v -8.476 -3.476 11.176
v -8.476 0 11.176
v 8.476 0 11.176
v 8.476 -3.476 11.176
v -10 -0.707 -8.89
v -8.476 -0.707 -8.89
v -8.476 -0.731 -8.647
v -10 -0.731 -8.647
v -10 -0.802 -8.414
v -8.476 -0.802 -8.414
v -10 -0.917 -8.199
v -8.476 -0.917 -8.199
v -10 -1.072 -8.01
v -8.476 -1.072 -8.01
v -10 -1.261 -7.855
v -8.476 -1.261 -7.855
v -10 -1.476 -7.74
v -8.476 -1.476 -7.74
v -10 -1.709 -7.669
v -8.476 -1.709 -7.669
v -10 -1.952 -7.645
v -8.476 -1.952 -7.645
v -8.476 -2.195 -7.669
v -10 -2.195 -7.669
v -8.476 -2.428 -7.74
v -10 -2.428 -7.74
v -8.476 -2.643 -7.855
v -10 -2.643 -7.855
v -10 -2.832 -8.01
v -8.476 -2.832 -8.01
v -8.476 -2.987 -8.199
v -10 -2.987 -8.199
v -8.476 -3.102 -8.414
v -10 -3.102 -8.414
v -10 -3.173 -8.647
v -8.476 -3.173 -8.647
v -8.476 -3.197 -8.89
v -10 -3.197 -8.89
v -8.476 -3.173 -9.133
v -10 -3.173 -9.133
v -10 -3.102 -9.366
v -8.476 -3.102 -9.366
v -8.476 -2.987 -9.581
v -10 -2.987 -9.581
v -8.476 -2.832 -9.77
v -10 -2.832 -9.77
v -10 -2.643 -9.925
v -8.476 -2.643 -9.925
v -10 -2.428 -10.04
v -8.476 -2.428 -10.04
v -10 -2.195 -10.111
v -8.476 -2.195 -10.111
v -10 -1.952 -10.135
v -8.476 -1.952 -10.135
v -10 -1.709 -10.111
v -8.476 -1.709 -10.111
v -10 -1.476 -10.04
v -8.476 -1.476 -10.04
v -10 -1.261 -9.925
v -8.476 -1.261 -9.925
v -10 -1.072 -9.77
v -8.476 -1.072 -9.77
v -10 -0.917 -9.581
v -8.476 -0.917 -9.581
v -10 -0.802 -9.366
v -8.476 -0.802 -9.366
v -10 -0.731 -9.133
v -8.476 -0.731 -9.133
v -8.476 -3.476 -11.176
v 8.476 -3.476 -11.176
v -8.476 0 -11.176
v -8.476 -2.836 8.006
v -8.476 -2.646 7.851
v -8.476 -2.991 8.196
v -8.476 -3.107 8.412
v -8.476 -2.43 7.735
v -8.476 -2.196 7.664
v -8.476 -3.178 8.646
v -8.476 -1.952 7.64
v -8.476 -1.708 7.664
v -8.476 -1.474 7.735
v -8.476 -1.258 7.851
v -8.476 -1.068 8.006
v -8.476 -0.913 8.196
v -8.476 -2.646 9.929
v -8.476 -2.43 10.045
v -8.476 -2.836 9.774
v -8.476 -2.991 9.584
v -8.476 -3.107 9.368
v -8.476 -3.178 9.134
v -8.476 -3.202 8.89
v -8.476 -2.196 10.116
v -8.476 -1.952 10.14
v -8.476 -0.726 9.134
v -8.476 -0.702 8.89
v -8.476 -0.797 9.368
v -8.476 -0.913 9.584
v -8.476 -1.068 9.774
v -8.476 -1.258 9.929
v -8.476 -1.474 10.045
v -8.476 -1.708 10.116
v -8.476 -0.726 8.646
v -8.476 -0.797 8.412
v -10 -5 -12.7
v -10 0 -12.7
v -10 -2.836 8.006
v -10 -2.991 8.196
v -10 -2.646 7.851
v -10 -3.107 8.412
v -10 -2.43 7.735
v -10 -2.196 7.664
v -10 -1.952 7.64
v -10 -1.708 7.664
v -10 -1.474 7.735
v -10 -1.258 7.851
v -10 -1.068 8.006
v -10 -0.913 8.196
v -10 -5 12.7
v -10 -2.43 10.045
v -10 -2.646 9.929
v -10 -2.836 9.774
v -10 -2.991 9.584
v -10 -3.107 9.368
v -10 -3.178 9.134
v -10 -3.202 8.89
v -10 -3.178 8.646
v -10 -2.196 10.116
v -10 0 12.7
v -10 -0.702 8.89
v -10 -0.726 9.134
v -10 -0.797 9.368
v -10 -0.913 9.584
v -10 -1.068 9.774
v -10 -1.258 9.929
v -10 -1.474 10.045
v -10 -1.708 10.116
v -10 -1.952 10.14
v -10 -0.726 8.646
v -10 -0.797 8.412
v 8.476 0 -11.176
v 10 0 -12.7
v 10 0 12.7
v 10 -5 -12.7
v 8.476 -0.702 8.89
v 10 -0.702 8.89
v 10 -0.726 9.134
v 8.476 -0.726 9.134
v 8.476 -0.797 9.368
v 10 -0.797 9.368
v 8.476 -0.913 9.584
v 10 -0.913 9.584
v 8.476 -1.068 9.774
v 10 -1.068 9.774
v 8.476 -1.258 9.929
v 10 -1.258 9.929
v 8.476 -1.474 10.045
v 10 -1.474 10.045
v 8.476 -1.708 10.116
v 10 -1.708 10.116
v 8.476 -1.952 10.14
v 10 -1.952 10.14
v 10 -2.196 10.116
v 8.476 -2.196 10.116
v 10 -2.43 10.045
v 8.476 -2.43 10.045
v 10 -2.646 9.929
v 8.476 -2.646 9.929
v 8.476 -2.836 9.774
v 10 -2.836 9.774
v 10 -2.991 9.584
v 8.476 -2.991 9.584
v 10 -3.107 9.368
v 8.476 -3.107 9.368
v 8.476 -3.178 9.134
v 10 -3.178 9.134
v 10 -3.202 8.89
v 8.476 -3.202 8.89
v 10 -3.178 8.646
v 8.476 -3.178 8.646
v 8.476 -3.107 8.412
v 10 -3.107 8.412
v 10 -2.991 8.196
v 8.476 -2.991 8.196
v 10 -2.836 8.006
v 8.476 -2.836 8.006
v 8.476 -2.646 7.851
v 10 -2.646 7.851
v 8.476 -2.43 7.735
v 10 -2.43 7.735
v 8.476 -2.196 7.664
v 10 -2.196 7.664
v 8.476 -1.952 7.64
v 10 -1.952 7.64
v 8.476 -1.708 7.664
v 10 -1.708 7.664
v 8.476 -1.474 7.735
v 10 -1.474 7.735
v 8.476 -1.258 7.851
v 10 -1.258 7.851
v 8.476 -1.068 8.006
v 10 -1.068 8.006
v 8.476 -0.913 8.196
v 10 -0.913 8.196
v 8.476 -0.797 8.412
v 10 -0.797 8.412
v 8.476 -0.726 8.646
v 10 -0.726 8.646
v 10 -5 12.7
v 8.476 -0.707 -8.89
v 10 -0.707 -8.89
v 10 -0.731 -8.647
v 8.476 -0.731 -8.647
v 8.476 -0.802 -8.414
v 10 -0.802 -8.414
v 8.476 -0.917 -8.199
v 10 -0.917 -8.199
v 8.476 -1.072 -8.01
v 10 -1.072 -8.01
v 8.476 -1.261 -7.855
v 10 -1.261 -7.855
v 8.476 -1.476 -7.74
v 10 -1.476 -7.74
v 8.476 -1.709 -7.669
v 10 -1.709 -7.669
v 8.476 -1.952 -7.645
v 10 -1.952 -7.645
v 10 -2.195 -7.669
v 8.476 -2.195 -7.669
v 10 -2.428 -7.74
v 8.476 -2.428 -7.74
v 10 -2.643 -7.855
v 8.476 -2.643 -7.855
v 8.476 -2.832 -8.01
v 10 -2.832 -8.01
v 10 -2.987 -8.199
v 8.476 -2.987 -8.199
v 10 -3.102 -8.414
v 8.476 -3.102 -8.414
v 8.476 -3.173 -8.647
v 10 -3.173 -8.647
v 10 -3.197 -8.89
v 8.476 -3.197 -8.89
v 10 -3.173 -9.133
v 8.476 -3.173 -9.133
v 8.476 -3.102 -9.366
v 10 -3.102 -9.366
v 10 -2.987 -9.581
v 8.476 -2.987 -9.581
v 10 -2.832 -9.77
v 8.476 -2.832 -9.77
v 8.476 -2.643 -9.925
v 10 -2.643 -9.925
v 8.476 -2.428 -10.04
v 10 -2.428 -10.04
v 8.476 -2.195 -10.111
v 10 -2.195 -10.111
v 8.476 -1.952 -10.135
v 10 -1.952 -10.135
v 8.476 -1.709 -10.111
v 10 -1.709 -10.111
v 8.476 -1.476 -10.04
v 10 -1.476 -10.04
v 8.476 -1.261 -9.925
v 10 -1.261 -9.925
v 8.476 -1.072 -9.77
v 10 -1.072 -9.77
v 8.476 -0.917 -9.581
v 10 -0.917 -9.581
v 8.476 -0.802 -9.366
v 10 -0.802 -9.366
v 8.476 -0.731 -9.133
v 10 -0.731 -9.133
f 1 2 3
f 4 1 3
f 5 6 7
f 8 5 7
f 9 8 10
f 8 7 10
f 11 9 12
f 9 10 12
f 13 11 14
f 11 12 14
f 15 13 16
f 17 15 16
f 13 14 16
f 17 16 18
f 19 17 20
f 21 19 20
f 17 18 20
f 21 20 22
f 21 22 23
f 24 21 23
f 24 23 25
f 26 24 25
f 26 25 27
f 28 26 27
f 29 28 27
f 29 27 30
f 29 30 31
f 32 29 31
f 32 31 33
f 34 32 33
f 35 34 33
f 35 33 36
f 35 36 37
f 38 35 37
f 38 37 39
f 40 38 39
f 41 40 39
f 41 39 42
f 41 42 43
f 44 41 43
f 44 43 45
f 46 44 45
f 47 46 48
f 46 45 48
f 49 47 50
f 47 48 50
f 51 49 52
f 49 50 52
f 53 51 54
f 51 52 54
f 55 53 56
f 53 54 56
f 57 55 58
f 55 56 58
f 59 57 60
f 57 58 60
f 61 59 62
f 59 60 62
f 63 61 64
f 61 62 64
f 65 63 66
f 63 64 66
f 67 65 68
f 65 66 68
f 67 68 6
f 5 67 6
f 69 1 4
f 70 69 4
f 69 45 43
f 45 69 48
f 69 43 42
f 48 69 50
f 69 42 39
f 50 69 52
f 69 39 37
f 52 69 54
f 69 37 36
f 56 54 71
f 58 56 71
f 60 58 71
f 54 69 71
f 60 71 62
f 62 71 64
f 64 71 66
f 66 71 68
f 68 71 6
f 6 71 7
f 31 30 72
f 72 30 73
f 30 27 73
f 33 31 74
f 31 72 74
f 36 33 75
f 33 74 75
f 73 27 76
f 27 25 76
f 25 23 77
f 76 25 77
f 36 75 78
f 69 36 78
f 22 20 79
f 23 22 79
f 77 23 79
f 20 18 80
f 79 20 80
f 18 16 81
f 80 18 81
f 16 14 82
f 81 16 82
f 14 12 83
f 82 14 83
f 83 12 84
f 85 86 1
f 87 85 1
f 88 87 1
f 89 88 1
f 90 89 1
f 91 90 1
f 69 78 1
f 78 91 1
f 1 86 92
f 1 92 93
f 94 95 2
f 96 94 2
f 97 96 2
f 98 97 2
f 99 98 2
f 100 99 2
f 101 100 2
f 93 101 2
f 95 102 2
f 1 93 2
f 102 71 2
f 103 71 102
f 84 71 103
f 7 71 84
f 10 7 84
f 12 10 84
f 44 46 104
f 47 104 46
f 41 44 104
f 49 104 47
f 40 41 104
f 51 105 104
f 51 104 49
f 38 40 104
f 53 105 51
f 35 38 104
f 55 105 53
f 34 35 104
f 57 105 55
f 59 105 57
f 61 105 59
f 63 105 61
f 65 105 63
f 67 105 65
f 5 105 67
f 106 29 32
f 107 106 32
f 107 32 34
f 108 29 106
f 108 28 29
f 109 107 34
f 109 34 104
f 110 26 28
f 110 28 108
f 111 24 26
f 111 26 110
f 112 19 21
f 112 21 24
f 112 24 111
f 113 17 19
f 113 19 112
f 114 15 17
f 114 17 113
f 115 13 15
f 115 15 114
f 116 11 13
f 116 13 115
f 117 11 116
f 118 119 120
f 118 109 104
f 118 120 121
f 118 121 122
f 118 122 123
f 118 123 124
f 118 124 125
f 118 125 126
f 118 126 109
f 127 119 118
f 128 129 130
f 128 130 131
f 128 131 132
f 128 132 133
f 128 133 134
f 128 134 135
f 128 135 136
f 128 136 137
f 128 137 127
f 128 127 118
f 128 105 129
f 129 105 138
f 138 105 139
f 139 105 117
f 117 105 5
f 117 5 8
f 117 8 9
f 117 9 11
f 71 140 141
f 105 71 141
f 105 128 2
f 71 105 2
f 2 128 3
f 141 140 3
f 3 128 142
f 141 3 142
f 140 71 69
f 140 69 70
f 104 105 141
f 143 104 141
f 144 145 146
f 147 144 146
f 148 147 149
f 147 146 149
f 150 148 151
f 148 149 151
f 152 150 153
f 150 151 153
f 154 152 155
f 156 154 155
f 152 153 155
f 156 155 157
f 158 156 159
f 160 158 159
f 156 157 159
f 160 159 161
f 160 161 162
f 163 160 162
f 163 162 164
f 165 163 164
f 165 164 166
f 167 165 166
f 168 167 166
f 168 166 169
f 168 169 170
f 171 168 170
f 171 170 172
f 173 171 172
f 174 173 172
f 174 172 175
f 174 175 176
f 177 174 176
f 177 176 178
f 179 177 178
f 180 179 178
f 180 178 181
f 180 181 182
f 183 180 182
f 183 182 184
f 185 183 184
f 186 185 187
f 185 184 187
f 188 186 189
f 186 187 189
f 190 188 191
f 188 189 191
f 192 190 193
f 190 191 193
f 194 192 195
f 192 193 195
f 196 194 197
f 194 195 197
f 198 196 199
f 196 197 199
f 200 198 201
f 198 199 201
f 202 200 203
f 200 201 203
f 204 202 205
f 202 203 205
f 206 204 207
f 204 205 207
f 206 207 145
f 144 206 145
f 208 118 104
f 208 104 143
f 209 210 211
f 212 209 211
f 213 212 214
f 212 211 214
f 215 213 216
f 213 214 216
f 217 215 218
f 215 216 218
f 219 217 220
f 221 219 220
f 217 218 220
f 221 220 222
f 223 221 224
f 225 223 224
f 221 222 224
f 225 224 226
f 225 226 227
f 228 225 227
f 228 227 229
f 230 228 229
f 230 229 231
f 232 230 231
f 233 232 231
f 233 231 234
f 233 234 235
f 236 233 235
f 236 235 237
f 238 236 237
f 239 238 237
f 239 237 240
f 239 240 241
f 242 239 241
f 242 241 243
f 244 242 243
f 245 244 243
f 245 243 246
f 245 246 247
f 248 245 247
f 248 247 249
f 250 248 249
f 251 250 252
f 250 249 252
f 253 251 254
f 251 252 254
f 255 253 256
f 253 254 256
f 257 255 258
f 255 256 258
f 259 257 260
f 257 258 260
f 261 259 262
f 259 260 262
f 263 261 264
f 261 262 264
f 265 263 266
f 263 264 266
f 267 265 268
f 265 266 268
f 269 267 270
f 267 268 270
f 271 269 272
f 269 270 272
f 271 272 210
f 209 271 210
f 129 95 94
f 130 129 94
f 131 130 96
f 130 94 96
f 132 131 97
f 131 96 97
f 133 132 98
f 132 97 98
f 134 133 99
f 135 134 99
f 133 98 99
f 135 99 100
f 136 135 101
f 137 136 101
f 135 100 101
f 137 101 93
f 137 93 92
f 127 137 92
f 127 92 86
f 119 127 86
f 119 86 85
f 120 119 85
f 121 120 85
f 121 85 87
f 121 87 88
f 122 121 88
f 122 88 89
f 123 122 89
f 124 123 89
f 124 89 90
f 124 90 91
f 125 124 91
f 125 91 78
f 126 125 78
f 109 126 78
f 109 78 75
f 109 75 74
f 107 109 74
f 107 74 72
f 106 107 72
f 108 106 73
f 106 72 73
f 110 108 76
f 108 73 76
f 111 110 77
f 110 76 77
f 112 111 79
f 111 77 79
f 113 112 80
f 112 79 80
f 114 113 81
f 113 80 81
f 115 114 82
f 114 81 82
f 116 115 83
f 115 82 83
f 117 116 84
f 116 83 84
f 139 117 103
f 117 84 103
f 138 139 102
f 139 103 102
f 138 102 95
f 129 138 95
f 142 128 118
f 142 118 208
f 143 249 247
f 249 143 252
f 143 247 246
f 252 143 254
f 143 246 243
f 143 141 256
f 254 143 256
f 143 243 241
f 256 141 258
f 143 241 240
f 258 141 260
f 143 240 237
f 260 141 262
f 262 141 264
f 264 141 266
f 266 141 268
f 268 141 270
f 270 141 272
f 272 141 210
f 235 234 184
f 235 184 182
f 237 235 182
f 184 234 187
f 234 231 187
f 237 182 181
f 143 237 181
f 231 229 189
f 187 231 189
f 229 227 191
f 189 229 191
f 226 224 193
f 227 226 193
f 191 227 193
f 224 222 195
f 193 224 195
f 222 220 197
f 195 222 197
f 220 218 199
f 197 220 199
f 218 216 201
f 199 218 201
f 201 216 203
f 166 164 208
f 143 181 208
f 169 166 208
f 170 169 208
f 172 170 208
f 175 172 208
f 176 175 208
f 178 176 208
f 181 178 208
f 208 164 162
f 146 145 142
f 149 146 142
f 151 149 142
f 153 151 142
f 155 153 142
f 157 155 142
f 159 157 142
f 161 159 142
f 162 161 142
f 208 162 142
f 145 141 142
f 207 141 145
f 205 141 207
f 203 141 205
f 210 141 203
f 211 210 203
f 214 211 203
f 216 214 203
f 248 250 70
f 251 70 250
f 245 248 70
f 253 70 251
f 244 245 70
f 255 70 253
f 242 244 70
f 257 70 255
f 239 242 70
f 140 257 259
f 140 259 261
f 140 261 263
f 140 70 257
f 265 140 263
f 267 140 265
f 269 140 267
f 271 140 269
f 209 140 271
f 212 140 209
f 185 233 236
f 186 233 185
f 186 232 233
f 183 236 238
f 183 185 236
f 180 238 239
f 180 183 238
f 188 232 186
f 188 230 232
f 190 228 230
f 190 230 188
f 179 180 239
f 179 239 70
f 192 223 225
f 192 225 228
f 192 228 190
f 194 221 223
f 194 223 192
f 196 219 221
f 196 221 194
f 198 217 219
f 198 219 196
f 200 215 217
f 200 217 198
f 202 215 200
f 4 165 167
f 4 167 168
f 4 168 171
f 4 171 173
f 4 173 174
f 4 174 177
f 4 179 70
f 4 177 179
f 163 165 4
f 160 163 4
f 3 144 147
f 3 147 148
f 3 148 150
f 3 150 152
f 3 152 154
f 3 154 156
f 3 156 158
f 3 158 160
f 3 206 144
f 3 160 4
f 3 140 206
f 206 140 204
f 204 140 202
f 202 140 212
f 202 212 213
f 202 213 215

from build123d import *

# Parameters (mm, degrees)
F0_W     = 20
F0_H     = 25.4
F1_DEPTH = 5
F2_T     = -1.524
F3_R     = 1.25
F3_R_2   = 1.2446
F4_DEPTH = 25.4


with BuildPart() as f1:
    # F0 (on Front) → F1 (new body)
    with BuildSketch(Plane.XZ):
        Rectangle(F0_W, F0_H)
    extrude(amount=F1_DEPTH)

    # F2
    f2_openings = [f1.faces().sort_by_distance(p)[0] for p in [
        (0, 0, 0),
    ]]
    offset(amount=F2_T, openings=f2_openings)

    # F3 (on face) → F4 (cut)
    with BuildSketch(Plane.YZ.offset(10)):
        with Locations((-1.952, 8.89)):
            Circle(F3_R)
        with Locations((-1.952, -8.89)):
            Circle(F3_R_2)
    extrude(amount=-F4_DEPTH, mode=Mode.SUBTRACT)


solid = f1.part
